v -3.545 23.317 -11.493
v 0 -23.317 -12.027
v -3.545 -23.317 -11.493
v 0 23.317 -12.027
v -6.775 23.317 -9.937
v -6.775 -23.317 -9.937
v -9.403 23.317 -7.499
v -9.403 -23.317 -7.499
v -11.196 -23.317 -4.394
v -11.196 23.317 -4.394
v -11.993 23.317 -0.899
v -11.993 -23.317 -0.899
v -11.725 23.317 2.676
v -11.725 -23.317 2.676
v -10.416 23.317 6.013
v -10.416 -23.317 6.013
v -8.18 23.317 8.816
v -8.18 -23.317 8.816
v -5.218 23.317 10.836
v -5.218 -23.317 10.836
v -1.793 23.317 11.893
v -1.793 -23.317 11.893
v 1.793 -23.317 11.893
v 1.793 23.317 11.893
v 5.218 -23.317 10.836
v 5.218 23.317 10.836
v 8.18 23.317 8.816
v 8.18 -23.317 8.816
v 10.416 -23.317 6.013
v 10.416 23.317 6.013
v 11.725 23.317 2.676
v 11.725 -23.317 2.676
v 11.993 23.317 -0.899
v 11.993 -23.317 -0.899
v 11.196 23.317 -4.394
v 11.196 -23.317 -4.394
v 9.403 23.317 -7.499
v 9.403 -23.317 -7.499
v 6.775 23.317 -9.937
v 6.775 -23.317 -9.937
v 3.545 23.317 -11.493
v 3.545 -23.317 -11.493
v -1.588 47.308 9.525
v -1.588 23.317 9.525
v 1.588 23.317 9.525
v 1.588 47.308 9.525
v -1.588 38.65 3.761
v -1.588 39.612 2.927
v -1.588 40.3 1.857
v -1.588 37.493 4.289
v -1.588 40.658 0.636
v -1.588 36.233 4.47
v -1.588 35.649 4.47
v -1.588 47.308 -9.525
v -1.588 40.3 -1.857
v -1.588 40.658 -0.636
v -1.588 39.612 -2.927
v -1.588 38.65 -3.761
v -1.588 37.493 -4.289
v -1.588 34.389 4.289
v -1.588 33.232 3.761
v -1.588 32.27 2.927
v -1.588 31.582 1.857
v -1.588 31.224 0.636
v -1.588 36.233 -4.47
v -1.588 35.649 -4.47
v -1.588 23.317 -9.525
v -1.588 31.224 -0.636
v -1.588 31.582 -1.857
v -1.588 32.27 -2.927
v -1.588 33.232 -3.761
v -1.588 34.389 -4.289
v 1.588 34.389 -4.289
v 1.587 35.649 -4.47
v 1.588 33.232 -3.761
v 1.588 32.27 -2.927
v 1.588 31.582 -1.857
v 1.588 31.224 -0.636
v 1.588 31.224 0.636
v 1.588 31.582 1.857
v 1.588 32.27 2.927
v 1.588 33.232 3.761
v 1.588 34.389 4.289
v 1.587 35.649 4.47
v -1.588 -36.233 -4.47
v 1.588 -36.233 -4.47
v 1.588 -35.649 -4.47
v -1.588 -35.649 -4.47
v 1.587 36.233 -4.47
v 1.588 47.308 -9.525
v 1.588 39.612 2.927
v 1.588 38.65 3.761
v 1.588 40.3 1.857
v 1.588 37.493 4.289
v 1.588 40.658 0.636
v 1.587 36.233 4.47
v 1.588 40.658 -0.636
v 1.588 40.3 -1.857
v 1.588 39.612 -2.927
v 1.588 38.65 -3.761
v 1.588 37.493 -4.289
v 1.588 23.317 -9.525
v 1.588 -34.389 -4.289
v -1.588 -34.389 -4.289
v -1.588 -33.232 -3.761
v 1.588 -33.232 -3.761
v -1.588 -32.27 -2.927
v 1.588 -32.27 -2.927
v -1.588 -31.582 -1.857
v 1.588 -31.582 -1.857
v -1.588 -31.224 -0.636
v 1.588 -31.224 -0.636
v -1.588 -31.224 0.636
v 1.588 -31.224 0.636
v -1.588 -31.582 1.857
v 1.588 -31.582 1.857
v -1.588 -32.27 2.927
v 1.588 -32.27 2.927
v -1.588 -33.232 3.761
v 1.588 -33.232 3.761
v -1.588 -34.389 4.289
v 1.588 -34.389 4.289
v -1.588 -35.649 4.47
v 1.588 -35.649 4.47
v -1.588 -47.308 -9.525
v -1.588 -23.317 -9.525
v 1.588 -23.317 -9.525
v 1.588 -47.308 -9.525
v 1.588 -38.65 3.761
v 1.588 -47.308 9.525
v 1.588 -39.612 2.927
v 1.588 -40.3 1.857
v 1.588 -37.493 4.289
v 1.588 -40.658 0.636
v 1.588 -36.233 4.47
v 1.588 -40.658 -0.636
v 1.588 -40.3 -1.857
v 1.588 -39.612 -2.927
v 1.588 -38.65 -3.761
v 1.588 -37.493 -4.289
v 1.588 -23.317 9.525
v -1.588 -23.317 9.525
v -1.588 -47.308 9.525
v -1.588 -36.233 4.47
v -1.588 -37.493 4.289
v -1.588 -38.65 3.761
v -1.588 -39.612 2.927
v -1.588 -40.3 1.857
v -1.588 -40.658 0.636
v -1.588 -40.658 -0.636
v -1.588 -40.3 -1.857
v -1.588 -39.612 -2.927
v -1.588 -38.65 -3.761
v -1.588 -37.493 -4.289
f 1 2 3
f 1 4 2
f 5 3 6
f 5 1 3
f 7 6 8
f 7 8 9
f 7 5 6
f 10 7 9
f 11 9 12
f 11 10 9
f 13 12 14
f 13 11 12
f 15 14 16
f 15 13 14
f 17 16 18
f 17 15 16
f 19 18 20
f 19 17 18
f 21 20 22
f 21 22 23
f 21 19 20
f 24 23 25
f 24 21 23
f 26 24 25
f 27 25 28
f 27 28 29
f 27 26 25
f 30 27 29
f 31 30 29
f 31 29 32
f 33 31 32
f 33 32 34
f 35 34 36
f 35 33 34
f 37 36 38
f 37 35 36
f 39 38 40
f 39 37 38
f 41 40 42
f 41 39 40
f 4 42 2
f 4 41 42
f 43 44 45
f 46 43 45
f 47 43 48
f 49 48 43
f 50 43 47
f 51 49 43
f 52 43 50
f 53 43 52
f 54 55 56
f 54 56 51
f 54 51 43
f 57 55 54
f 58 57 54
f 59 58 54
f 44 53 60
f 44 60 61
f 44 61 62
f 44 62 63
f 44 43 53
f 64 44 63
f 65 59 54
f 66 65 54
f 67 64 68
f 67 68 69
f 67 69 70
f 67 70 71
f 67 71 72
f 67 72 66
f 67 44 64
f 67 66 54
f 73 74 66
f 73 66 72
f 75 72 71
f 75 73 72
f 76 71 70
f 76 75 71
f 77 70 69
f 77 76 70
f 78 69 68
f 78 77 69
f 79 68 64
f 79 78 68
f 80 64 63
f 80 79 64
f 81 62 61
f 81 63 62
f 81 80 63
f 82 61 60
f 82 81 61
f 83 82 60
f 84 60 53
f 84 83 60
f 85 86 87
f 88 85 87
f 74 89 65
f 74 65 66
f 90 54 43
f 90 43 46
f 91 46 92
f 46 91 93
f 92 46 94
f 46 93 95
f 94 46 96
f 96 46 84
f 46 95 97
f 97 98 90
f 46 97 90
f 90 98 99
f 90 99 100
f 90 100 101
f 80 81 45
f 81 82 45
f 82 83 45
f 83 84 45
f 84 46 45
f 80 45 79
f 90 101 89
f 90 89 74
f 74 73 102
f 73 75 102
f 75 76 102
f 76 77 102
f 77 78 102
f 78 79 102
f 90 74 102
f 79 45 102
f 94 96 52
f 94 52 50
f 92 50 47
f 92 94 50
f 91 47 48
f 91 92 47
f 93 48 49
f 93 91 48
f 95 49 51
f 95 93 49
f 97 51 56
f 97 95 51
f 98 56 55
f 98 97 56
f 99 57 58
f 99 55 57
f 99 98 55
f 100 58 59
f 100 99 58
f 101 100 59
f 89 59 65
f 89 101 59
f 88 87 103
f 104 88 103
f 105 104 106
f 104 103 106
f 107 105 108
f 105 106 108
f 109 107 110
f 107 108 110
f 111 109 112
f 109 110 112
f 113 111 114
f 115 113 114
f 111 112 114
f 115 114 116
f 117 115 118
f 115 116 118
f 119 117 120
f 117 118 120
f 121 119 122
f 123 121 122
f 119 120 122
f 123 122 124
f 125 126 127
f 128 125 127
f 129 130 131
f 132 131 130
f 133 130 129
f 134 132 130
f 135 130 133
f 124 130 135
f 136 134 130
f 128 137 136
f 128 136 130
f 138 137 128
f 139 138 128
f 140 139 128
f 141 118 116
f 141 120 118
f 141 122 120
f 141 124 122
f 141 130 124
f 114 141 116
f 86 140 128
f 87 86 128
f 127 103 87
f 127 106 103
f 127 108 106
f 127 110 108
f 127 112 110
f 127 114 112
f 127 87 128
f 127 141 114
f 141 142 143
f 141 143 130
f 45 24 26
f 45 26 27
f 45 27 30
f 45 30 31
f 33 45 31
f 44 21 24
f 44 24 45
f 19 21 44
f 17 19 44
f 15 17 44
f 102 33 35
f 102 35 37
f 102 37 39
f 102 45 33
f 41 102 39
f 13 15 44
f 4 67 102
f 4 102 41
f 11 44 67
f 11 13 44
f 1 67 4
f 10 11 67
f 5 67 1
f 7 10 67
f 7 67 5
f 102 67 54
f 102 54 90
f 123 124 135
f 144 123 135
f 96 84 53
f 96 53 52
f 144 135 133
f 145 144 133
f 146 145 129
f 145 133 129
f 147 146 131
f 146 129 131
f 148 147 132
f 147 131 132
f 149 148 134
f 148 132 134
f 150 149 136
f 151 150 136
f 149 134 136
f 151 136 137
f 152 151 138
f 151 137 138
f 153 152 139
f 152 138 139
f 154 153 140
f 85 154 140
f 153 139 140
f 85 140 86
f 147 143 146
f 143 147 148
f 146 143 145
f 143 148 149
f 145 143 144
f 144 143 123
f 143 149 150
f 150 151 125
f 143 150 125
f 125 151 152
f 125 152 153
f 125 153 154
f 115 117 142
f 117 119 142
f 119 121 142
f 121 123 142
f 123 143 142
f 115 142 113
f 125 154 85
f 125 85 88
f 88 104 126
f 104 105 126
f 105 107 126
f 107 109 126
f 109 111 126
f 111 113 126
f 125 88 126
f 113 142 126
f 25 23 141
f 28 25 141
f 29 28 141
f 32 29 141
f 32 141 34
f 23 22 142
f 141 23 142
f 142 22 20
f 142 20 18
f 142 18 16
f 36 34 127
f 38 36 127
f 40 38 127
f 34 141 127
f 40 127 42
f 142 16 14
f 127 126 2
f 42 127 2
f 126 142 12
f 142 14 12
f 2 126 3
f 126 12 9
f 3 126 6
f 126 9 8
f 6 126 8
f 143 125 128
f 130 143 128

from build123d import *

# Parameters (mm, degrees)
SKETCH1_R           = 12.0269
BOSS_EXTRUDE1_DEPTH = 23.3172
SKETCH3_W           = 3.175
SKETCH3_H           = 19.05
BOSS_EXTRUDE3_DEPTH = 23.9903
CUT_EXTRUDE1_DEPTH  = 10


with BuildPart() as part:
    # Sketch1 → Boss-Extrude1 (new, symmetric)
    with BuildSketch(Plane(origin=(0, 0, 0), x_dir=(1, 0, 0), z_dir=(0, 1, 0))):
        with Locations(Location((0, 0, 0), (0, 0, 90))):
            Circle(SKETCH1_R)
    extrude(amount=BOSS_EXTRUDE1_DEPTH, both=True)

    # Sketch3 → Boss-Extrude3 (add)
    with BuildSketch(Plane(origin=(0, 23.3172, 0), x_dir=(1, 0, 0), z_dir=(0, 1, 0))):
        Rectangle(SKETCH3_W, SKETCH3_H)
    boss_extrude3 = extrude(amount=BOSS_EXTRUDE3_DEPTH)

    # Sketch4 → Cut-Extrude1 (cut)
    with BuildSketch(Plane(origin=(1.5875, 0, 0), x_dir=(0, 0, -1), z_dir=(1, 0, 0))):
        with BuildLine():
            Line((4.4704, 36.2331), (4.4704, 35.6489))
            ThreePointArc((4.4704, 35.6489), (0, 31.1785), (-4.4704, 35.6489))
            Line((-4.4704, 35.6489), (-4.4704, 36.2331))
            ThreePointArc((-4.4704, 36.2331), (0, 40.7035), (4.4704, 36.2331))
        make_face()
        with BuildLine():
            Line((4.4704, -36.2331), (4.4704, -35.6489))
            ThreePointArc((4.4704, -35.6489), (0, -31.1785), (-4.4704, -35.6489))
            Line((-4.4704, -35.6489), (-4.4704, -36.2331))
            ThreePointArc((-4.4704, -36.2331), (0, -40.7035), (4.4704, -36.2331))
        make_face()
    cut_extrude1 = extrude(amount=-CUT_EXTRUDE1_DEPTH, mode=Mode.SUBTRACT)

    # Mirror1: Boss-Extrude3, Cut-Extrude1 across plane
    add(boss_extrude3.mirror(Plane.ZX))
    add(cut_extrude1.mirror(Plane.ZX), mode=Mode.SUBTRACT)


solid = part.part
